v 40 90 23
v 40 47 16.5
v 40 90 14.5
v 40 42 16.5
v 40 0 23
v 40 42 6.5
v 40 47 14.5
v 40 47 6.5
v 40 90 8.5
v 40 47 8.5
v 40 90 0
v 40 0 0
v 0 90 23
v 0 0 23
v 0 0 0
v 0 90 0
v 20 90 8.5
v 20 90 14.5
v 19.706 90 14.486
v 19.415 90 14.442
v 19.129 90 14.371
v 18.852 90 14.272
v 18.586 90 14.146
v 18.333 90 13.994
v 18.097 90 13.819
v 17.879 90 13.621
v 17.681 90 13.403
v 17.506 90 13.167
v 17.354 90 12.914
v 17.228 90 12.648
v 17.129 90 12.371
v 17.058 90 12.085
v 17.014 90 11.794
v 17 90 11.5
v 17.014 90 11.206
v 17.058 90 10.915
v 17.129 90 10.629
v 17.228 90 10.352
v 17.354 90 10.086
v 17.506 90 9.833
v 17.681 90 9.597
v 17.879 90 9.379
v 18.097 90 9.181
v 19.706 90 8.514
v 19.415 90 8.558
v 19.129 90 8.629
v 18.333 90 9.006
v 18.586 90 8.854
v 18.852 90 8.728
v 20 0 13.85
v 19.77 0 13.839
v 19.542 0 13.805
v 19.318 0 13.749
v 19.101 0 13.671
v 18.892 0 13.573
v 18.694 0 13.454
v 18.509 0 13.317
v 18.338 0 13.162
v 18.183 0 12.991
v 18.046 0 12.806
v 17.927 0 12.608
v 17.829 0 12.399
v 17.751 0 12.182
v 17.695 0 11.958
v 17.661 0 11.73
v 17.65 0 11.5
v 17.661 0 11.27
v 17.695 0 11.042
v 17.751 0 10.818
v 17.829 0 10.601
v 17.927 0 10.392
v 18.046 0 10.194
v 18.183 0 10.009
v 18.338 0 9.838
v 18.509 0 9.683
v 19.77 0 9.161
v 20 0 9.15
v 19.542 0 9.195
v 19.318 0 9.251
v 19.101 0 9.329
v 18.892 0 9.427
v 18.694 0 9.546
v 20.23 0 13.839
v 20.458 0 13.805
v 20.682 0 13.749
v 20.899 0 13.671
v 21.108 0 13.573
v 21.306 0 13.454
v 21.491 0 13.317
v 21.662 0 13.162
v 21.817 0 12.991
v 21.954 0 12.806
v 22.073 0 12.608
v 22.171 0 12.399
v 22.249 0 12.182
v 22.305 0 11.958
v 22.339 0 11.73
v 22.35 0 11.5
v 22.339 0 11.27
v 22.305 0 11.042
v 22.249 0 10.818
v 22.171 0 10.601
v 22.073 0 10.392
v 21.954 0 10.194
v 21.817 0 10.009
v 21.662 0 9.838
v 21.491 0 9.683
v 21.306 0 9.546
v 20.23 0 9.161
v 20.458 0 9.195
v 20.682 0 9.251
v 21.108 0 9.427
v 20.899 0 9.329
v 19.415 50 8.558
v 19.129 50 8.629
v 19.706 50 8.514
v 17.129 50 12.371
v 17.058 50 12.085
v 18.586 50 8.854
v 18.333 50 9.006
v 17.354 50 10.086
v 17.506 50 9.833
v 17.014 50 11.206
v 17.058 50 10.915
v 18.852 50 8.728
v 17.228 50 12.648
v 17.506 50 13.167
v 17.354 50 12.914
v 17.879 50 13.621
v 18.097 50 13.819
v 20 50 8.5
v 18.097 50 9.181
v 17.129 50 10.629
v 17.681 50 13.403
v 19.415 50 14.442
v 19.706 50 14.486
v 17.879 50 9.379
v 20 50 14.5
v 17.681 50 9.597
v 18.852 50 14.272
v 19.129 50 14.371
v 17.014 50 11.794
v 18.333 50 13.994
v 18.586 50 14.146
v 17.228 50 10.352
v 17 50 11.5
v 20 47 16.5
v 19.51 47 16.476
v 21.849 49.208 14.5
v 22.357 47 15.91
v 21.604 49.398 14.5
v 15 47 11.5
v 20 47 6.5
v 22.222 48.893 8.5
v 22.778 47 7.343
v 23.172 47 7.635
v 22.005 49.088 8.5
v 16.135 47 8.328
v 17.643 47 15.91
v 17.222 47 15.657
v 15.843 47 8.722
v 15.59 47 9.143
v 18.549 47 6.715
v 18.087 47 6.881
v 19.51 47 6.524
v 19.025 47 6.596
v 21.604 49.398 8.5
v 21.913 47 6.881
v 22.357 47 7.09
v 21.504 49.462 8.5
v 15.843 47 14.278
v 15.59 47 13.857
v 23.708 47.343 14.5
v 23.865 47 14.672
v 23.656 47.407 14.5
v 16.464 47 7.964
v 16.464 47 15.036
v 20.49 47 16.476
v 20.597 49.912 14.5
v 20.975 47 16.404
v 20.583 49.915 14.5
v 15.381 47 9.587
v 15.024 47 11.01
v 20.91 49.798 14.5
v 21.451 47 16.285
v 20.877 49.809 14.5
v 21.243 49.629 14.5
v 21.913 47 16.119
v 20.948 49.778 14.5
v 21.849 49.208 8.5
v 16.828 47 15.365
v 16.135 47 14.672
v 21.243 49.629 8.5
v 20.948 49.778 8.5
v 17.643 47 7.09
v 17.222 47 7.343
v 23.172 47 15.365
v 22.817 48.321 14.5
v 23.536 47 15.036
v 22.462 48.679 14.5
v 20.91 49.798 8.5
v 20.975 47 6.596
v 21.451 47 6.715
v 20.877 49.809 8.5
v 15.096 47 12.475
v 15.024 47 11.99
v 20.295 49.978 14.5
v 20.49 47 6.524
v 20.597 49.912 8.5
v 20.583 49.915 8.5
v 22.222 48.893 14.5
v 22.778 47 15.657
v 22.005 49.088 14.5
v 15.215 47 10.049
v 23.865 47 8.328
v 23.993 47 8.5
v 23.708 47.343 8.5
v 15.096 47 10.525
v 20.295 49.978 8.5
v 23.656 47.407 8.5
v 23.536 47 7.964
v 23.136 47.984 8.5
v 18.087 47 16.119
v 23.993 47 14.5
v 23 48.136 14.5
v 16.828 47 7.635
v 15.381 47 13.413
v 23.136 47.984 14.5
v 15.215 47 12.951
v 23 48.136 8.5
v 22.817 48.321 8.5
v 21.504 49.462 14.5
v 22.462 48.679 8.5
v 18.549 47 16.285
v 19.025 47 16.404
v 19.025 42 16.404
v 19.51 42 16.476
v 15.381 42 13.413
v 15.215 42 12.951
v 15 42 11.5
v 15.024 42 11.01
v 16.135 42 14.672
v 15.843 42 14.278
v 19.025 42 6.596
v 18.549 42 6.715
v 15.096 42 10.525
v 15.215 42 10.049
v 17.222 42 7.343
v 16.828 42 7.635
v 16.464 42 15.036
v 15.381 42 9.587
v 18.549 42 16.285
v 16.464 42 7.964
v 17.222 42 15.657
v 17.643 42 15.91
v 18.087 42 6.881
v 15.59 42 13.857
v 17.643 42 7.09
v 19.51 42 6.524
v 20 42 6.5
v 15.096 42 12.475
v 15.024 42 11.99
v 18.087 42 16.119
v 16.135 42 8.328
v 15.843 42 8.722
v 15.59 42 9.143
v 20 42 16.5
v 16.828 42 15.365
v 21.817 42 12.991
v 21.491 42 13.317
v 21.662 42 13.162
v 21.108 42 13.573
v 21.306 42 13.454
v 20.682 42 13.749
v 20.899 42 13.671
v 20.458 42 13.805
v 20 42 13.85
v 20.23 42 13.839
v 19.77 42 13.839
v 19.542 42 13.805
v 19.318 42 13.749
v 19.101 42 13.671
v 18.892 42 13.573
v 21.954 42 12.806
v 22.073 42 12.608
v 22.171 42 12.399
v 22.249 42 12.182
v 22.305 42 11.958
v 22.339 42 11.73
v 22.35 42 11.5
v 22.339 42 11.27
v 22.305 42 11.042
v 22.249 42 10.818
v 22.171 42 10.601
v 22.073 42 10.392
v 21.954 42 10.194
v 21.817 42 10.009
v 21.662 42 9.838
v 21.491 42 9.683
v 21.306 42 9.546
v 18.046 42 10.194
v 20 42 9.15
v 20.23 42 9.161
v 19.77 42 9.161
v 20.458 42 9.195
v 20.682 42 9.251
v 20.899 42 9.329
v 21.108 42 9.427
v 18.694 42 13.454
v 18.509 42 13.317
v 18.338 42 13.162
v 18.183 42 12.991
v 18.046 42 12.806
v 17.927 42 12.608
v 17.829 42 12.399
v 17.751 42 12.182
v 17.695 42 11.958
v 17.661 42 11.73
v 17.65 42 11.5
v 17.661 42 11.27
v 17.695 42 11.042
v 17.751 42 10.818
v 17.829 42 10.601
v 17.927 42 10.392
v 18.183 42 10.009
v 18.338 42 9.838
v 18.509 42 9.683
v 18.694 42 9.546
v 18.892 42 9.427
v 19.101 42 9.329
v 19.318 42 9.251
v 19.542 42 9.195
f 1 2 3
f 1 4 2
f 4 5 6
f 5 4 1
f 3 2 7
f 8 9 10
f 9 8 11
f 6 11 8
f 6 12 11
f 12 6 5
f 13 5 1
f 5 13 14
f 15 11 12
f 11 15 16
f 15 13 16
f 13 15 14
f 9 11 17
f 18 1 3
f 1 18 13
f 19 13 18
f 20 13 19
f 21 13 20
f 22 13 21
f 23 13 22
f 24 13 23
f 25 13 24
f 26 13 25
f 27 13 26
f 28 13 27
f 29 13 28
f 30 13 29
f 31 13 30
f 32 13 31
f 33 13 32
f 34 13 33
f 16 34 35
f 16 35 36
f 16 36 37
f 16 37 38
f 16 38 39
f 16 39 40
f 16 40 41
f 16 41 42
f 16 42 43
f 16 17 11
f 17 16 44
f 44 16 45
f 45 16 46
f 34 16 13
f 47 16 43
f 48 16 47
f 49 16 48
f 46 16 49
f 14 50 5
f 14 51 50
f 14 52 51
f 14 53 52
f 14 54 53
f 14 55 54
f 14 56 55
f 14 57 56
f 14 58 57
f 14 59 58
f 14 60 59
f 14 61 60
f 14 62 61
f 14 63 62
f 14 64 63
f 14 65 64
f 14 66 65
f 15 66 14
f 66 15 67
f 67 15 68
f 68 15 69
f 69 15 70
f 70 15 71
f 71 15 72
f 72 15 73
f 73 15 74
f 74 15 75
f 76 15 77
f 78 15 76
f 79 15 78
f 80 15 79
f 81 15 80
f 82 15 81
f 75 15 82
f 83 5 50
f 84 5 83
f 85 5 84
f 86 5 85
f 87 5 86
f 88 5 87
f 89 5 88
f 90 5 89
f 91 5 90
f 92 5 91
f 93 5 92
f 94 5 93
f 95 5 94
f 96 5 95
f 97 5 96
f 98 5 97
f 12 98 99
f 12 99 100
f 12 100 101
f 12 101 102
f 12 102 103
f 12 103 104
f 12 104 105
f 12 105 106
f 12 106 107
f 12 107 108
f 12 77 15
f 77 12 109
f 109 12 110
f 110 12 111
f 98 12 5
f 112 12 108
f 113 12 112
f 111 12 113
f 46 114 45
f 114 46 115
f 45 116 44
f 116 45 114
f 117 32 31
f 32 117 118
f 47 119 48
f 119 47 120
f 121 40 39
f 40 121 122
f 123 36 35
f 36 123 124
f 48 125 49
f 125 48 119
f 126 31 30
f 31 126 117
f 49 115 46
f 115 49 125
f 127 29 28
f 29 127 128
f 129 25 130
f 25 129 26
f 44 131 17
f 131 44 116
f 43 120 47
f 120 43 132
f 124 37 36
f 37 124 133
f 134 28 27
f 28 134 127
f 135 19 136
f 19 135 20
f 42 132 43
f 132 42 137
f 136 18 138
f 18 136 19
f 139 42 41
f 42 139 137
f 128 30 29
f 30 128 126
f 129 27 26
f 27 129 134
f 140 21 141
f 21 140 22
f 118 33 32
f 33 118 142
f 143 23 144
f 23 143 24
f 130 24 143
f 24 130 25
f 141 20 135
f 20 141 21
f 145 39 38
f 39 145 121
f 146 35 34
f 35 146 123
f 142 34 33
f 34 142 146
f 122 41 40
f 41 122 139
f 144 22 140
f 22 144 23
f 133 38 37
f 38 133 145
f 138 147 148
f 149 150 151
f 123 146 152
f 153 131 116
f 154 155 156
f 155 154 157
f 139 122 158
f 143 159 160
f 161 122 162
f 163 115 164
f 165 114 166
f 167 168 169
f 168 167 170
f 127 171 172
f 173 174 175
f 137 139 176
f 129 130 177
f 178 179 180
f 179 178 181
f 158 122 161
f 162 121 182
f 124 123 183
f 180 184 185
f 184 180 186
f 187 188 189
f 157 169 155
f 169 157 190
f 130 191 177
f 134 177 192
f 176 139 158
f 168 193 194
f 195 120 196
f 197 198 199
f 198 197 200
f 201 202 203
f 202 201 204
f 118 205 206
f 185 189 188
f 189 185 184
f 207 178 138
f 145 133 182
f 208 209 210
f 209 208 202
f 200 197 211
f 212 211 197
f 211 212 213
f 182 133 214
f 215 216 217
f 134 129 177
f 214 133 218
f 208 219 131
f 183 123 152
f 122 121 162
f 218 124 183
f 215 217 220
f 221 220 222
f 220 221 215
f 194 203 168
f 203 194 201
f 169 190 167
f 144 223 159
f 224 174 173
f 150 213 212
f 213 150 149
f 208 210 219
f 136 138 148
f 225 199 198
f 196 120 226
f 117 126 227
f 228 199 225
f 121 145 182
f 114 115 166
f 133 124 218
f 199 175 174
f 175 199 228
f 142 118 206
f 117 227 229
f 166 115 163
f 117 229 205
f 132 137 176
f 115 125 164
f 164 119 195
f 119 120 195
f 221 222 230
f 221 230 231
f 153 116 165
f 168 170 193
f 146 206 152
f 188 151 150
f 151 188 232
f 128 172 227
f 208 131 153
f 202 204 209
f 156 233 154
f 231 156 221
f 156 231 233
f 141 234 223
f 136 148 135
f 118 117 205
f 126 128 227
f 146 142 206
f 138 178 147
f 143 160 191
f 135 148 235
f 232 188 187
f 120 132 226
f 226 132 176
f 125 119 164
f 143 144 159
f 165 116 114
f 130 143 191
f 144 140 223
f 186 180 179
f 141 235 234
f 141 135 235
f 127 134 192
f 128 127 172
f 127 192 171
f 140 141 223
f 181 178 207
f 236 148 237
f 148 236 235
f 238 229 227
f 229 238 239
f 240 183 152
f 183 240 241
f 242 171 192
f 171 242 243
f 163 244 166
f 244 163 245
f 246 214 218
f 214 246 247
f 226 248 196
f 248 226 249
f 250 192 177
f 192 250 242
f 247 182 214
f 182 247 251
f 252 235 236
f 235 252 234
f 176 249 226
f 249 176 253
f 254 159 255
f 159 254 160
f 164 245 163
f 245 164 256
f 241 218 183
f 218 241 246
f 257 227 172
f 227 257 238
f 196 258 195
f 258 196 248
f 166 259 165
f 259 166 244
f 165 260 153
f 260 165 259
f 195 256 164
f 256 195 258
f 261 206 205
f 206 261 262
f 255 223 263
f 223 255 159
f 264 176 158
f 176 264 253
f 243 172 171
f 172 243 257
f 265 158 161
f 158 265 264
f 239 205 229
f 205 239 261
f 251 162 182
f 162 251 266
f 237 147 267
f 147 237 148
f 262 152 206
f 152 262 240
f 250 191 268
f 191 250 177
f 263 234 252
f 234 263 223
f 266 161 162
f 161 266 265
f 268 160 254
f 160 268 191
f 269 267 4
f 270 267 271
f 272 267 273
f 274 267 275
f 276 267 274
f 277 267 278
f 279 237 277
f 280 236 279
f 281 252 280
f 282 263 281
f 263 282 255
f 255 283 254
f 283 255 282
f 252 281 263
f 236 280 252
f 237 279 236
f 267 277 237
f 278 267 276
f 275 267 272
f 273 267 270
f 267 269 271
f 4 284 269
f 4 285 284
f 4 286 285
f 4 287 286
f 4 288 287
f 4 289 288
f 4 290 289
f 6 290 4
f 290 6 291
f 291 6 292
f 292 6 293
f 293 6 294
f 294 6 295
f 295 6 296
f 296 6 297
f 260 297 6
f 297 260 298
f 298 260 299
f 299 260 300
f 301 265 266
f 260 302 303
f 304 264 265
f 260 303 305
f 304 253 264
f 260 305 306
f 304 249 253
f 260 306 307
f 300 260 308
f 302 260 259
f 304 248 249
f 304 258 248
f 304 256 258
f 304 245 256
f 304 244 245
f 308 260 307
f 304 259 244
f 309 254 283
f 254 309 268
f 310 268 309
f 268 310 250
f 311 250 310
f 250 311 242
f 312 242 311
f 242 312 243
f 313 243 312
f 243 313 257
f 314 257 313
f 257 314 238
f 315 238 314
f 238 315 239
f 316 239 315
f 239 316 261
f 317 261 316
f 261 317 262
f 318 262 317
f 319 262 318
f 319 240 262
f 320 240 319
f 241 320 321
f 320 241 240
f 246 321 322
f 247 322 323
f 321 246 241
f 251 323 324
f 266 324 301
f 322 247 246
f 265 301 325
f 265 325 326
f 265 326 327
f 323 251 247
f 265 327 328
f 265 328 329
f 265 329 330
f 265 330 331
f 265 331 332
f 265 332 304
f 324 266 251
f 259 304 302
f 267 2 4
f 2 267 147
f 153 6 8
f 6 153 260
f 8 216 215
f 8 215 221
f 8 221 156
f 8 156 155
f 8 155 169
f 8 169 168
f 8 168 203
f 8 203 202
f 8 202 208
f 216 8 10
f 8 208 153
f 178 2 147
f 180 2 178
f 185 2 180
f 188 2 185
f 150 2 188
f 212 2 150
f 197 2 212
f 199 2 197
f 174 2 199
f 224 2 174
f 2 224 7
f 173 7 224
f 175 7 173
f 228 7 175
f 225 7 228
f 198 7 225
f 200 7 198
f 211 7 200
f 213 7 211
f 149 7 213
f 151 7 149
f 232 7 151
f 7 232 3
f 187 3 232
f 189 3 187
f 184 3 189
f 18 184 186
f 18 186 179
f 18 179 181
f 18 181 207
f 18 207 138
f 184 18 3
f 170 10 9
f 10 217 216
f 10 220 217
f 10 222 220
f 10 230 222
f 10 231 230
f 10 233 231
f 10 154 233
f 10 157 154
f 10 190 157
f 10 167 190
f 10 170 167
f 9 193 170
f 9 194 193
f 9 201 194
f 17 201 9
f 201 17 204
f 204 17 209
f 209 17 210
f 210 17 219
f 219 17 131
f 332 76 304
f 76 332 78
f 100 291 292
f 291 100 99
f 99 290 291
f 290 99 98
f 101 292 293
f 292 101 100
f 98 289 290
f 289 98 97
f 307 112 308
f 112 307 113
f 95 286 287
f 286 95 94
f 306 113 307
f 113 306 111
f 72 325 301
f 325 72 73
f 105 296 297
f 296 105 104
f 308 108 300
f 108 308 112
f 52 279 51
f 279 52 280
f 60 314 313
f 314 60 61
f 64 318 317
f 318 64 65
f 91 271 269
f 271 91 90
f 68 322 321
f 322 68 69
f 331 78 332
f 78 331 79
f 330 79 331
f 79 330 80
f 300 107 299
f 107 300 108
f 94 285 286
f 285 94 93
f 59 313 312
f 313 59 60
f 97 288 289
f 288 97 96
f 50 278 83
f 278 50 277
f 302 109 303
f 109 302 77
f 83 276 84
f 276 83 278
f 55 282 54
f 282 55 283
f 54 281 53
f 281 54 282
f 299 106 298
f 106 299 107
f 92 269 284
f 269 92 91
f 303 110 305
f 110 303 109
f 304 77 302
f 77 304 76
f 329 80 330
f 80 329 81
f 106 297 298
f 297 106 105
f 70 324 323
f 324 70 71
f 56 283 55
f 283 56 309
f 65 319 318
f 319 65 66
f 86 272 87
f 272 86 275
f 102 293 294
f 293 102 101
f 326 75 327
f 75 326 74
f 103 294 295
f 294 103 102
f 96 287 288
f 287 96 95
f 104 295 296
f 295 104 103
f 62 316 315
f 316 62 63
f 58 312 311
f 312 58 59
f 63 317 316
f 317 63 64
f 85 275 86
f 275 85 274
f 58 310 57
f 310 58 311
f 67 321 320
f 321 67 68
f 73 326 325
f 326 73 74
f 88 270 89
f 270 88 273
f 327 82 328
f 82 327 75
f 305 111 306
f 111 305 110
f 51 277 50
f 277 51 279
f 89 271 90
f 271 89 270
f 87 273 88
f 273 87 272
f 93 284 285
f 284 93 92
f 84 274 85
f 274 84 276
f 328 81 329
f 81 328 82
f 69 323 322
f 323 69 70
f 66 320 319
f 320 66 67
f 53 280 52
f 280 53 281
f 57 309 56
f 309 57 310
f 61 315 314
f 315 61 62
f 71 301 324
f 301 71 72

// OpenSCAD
$fn = 64;

width = 40;
length = 90;
height = 23;
hole_position = [width/2, height/2];
screw_hole_depth = 40;

render() {
  difference() {
    cube([width, length, height]);

    // Wall screw hole
    translate([hole_position[0], length - screw_hole_depth, hole_position[1]])
      rotate([-90, 0, 0])
        cylinder(h=screw_hole_depth, d=6);

    // Countersink for wall screw
    translate([hole_position[0], length - screw_hole_depth - 3, hole_position[1]])
      rotate([-90, 0, 0])
        cylinder(h=3, d1=10, d2=6);
    
    // Wall screw hole - wide part
    translate([hole_position[0], length - screw_hole_depth - 3 - 5, hole_position[1]])
      rotate([-90, 0, 0])
        cylinder(h=5, d=10);

    // Wall screw access cavity - wide part
    translate([hole_position[0], length - screw_hole_depth - 3 - 5, hole_position[1] -(10/2)])
      cube([width, 5, 10]);
    
    // Wall screw access cavity - narrow part
    translate([hole_position[0], length - screw_hole_depth - 3, hole_position[1] -(6/2)])
      cube([width, screw_hole_depth + 3, 6]);

    // M5 screw hole
    translate([hole_position[0], 0, hole_position[1]])
      rotate([-90, 0, 0])
        cylinder(h=length, d=4.7);
  }
}
